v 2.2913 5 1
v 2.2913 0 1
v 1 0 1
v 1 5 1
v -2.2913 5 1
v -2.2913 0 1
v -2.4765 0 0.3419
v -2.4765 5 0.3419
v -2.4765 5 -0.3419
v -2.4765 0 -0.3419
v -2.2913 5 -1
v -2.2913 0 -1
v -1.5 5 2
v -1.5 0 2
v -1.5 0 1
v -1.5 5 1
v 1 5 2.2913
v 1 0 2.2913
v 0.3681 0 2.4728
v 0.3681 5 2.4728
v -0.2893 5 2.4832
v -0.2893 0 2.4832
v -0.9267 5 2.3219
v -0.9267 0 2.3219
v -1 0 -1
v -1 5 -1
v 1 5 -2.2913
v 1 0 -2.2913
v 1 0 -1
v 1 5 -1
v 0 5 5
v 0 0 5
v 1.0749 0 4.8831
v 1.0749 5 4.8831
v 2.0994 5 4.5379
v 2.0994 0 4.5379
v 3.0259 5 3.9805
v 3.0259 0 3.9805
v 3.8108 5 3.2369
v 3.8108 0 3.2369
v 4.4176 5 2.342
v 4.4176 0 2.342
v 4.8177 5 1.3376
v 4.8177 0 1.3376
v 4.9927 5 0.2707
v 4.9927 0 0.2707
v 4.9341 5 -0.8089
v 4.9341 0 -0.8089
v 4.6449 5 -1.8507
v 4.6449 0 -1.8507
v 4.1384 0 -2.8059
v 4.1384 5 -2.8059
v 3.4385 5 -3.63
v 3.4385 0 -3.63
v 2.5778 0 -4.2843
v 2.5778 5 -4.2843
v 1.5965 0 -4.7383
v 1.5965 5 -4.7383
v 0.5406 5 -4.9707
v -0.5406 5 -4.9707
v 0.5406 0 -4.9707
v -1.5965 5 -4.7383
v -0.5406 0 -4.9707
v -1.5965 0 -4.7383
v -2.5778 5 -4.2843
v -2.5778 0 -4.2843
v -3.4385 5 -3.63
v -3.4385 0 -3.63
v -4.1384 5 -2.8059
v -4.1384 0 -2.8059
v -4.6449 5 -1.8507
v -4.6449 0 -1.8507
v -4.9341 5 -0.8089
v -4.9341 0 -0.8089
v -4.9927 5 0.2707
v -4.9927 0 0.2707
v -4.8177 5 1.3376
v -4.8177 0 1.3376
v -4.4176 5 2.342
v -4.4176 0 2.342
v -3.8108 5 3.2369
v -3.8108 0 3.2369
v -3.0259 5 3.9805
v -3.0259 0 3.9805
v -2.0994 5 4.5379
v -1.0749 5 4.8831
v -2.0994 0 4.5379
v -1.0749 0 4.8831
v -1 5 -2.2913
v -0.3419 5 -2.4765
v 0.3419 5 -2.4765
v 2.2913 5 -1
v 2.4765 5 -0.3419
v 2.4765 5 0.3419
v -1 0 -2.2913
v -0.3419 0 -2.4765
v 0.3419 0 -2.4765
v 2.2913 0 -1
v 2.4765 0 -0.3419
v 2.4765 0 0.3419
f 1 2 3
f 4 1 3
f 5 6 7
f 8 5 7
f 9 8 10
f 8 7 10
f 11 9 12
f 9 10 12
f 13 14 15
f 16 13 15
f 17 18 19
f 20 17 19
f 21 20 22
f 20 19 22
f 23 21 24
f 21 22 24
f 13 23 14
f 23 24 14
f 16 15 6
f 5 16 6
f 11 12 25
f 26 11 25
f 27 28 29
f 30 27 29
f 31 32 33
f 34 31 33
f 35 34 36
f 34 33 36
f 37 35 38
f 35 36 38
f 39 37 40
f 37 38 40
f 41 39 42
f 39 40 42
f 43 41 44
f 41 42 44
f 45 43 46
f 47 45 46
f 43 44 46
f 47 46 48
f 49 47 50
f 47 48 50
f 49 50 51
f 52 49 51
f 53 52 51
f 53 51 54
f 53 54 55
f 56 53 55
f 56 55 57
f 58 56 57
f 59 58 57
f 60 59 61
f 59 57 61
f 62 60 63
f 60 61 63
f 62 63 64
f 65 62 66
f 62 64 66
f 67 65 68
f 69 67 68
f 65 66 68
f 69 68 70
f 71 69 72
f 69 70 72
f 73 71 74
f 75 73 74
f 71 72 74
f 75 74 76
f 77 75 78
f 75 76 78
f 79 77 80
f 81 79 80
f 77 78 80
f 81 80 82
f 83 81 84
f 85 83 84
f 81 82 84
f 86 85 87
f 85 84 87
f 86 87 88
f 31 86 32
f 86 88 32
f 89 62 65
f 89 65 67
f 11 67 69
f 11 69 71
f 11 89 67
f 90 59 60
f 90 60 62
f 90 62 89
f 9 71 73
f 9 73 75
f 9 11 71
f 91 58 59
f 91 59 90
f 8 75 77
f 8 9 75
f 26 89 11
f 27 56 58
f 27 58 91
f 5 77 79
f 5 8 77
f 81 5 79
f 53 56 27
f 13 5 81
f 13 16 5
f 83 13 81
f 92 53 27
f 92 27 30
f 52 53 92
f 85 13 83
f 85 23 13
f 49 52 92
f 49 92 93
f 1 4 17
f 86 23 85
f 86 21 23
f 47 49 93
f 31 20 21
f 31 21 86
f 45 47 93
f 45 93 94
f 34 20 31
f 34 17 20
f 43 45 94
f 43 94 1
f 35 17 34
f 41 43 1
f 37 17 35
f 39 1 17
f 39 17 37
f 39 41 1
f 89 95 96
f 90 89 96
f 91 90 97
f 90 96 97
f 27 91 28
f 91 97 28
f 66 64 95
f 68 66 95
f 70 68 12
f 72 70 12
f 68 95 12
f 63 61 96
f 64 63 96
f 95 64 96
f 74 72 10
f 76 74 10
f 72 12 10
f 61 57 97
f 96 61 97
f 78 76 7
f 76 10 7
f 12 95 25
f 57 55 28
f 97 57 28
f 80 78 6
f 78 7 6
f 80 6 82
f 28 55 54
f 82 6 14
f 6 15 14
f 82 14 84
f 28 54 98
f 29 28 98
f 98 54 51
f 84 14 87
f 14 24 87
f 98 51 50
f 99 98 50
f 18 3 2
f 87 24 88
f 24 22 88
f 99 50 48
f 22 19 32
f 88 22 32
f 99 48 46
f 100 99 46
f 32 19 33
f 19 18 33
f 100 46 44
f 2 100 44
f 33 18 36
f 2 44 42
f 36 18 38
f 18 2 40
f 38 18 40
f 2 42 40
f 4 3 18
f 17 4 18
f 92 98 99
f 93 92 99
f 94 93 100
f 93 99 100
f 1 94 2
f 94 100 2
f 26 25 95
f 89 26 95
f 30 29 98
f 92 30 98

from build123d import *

# Parameters (mm, degrees)
SKETCH1_R           = 5
BOSS_EXTRUDE1_DEPTH = 5


with BuildPart() as part:
    # Sketch1 → Boss-Extrude1 (new body)
    with BuildSketch(Plane(origin=(0, 0, 0), x_dir=(1, 0, 0), z_dir=(0, 1, 0))):
        with Locations(Location((0, 0, 0), (0, 0, 270))):
            Circle(SKETCH1_R)
        with BuildLine():
            Line((1, -1), (1, -2.291287847))
            ThreePointArc((1, -2.291287847), (-0.289330525, -2.483201129), (-1.5, -2))
            Line((-1.5, -2), (-1.5, -1))
            Line((-1.5, -1), (-2.291287847, -1))
            ThreePointArc((-2.291287847, -1), (-2.5, 0), (-2.291287847, 1))
            Line((-2.291287847, 1), (-1, 1))
            Line((-1, 1), (-1, 2.291287847))
            ThreePointArc((-1, 2.291287847), (0, 2.5), (1, 2.291287847))
            Line((1, 2.291287847), (1, 1))
            Line((1, 1), (2.291287847, 1))
            ThreePointArc((2.291287847, 1), (2.5, 0), (2.291287847, -1))
            Line((2.291287847, -1), (1, -1))
        make_face(mode=Mode.SUBTRACT)
    extrude(amount=BOSS_EXTRUDE1_DEPTH)


solid = part.part
